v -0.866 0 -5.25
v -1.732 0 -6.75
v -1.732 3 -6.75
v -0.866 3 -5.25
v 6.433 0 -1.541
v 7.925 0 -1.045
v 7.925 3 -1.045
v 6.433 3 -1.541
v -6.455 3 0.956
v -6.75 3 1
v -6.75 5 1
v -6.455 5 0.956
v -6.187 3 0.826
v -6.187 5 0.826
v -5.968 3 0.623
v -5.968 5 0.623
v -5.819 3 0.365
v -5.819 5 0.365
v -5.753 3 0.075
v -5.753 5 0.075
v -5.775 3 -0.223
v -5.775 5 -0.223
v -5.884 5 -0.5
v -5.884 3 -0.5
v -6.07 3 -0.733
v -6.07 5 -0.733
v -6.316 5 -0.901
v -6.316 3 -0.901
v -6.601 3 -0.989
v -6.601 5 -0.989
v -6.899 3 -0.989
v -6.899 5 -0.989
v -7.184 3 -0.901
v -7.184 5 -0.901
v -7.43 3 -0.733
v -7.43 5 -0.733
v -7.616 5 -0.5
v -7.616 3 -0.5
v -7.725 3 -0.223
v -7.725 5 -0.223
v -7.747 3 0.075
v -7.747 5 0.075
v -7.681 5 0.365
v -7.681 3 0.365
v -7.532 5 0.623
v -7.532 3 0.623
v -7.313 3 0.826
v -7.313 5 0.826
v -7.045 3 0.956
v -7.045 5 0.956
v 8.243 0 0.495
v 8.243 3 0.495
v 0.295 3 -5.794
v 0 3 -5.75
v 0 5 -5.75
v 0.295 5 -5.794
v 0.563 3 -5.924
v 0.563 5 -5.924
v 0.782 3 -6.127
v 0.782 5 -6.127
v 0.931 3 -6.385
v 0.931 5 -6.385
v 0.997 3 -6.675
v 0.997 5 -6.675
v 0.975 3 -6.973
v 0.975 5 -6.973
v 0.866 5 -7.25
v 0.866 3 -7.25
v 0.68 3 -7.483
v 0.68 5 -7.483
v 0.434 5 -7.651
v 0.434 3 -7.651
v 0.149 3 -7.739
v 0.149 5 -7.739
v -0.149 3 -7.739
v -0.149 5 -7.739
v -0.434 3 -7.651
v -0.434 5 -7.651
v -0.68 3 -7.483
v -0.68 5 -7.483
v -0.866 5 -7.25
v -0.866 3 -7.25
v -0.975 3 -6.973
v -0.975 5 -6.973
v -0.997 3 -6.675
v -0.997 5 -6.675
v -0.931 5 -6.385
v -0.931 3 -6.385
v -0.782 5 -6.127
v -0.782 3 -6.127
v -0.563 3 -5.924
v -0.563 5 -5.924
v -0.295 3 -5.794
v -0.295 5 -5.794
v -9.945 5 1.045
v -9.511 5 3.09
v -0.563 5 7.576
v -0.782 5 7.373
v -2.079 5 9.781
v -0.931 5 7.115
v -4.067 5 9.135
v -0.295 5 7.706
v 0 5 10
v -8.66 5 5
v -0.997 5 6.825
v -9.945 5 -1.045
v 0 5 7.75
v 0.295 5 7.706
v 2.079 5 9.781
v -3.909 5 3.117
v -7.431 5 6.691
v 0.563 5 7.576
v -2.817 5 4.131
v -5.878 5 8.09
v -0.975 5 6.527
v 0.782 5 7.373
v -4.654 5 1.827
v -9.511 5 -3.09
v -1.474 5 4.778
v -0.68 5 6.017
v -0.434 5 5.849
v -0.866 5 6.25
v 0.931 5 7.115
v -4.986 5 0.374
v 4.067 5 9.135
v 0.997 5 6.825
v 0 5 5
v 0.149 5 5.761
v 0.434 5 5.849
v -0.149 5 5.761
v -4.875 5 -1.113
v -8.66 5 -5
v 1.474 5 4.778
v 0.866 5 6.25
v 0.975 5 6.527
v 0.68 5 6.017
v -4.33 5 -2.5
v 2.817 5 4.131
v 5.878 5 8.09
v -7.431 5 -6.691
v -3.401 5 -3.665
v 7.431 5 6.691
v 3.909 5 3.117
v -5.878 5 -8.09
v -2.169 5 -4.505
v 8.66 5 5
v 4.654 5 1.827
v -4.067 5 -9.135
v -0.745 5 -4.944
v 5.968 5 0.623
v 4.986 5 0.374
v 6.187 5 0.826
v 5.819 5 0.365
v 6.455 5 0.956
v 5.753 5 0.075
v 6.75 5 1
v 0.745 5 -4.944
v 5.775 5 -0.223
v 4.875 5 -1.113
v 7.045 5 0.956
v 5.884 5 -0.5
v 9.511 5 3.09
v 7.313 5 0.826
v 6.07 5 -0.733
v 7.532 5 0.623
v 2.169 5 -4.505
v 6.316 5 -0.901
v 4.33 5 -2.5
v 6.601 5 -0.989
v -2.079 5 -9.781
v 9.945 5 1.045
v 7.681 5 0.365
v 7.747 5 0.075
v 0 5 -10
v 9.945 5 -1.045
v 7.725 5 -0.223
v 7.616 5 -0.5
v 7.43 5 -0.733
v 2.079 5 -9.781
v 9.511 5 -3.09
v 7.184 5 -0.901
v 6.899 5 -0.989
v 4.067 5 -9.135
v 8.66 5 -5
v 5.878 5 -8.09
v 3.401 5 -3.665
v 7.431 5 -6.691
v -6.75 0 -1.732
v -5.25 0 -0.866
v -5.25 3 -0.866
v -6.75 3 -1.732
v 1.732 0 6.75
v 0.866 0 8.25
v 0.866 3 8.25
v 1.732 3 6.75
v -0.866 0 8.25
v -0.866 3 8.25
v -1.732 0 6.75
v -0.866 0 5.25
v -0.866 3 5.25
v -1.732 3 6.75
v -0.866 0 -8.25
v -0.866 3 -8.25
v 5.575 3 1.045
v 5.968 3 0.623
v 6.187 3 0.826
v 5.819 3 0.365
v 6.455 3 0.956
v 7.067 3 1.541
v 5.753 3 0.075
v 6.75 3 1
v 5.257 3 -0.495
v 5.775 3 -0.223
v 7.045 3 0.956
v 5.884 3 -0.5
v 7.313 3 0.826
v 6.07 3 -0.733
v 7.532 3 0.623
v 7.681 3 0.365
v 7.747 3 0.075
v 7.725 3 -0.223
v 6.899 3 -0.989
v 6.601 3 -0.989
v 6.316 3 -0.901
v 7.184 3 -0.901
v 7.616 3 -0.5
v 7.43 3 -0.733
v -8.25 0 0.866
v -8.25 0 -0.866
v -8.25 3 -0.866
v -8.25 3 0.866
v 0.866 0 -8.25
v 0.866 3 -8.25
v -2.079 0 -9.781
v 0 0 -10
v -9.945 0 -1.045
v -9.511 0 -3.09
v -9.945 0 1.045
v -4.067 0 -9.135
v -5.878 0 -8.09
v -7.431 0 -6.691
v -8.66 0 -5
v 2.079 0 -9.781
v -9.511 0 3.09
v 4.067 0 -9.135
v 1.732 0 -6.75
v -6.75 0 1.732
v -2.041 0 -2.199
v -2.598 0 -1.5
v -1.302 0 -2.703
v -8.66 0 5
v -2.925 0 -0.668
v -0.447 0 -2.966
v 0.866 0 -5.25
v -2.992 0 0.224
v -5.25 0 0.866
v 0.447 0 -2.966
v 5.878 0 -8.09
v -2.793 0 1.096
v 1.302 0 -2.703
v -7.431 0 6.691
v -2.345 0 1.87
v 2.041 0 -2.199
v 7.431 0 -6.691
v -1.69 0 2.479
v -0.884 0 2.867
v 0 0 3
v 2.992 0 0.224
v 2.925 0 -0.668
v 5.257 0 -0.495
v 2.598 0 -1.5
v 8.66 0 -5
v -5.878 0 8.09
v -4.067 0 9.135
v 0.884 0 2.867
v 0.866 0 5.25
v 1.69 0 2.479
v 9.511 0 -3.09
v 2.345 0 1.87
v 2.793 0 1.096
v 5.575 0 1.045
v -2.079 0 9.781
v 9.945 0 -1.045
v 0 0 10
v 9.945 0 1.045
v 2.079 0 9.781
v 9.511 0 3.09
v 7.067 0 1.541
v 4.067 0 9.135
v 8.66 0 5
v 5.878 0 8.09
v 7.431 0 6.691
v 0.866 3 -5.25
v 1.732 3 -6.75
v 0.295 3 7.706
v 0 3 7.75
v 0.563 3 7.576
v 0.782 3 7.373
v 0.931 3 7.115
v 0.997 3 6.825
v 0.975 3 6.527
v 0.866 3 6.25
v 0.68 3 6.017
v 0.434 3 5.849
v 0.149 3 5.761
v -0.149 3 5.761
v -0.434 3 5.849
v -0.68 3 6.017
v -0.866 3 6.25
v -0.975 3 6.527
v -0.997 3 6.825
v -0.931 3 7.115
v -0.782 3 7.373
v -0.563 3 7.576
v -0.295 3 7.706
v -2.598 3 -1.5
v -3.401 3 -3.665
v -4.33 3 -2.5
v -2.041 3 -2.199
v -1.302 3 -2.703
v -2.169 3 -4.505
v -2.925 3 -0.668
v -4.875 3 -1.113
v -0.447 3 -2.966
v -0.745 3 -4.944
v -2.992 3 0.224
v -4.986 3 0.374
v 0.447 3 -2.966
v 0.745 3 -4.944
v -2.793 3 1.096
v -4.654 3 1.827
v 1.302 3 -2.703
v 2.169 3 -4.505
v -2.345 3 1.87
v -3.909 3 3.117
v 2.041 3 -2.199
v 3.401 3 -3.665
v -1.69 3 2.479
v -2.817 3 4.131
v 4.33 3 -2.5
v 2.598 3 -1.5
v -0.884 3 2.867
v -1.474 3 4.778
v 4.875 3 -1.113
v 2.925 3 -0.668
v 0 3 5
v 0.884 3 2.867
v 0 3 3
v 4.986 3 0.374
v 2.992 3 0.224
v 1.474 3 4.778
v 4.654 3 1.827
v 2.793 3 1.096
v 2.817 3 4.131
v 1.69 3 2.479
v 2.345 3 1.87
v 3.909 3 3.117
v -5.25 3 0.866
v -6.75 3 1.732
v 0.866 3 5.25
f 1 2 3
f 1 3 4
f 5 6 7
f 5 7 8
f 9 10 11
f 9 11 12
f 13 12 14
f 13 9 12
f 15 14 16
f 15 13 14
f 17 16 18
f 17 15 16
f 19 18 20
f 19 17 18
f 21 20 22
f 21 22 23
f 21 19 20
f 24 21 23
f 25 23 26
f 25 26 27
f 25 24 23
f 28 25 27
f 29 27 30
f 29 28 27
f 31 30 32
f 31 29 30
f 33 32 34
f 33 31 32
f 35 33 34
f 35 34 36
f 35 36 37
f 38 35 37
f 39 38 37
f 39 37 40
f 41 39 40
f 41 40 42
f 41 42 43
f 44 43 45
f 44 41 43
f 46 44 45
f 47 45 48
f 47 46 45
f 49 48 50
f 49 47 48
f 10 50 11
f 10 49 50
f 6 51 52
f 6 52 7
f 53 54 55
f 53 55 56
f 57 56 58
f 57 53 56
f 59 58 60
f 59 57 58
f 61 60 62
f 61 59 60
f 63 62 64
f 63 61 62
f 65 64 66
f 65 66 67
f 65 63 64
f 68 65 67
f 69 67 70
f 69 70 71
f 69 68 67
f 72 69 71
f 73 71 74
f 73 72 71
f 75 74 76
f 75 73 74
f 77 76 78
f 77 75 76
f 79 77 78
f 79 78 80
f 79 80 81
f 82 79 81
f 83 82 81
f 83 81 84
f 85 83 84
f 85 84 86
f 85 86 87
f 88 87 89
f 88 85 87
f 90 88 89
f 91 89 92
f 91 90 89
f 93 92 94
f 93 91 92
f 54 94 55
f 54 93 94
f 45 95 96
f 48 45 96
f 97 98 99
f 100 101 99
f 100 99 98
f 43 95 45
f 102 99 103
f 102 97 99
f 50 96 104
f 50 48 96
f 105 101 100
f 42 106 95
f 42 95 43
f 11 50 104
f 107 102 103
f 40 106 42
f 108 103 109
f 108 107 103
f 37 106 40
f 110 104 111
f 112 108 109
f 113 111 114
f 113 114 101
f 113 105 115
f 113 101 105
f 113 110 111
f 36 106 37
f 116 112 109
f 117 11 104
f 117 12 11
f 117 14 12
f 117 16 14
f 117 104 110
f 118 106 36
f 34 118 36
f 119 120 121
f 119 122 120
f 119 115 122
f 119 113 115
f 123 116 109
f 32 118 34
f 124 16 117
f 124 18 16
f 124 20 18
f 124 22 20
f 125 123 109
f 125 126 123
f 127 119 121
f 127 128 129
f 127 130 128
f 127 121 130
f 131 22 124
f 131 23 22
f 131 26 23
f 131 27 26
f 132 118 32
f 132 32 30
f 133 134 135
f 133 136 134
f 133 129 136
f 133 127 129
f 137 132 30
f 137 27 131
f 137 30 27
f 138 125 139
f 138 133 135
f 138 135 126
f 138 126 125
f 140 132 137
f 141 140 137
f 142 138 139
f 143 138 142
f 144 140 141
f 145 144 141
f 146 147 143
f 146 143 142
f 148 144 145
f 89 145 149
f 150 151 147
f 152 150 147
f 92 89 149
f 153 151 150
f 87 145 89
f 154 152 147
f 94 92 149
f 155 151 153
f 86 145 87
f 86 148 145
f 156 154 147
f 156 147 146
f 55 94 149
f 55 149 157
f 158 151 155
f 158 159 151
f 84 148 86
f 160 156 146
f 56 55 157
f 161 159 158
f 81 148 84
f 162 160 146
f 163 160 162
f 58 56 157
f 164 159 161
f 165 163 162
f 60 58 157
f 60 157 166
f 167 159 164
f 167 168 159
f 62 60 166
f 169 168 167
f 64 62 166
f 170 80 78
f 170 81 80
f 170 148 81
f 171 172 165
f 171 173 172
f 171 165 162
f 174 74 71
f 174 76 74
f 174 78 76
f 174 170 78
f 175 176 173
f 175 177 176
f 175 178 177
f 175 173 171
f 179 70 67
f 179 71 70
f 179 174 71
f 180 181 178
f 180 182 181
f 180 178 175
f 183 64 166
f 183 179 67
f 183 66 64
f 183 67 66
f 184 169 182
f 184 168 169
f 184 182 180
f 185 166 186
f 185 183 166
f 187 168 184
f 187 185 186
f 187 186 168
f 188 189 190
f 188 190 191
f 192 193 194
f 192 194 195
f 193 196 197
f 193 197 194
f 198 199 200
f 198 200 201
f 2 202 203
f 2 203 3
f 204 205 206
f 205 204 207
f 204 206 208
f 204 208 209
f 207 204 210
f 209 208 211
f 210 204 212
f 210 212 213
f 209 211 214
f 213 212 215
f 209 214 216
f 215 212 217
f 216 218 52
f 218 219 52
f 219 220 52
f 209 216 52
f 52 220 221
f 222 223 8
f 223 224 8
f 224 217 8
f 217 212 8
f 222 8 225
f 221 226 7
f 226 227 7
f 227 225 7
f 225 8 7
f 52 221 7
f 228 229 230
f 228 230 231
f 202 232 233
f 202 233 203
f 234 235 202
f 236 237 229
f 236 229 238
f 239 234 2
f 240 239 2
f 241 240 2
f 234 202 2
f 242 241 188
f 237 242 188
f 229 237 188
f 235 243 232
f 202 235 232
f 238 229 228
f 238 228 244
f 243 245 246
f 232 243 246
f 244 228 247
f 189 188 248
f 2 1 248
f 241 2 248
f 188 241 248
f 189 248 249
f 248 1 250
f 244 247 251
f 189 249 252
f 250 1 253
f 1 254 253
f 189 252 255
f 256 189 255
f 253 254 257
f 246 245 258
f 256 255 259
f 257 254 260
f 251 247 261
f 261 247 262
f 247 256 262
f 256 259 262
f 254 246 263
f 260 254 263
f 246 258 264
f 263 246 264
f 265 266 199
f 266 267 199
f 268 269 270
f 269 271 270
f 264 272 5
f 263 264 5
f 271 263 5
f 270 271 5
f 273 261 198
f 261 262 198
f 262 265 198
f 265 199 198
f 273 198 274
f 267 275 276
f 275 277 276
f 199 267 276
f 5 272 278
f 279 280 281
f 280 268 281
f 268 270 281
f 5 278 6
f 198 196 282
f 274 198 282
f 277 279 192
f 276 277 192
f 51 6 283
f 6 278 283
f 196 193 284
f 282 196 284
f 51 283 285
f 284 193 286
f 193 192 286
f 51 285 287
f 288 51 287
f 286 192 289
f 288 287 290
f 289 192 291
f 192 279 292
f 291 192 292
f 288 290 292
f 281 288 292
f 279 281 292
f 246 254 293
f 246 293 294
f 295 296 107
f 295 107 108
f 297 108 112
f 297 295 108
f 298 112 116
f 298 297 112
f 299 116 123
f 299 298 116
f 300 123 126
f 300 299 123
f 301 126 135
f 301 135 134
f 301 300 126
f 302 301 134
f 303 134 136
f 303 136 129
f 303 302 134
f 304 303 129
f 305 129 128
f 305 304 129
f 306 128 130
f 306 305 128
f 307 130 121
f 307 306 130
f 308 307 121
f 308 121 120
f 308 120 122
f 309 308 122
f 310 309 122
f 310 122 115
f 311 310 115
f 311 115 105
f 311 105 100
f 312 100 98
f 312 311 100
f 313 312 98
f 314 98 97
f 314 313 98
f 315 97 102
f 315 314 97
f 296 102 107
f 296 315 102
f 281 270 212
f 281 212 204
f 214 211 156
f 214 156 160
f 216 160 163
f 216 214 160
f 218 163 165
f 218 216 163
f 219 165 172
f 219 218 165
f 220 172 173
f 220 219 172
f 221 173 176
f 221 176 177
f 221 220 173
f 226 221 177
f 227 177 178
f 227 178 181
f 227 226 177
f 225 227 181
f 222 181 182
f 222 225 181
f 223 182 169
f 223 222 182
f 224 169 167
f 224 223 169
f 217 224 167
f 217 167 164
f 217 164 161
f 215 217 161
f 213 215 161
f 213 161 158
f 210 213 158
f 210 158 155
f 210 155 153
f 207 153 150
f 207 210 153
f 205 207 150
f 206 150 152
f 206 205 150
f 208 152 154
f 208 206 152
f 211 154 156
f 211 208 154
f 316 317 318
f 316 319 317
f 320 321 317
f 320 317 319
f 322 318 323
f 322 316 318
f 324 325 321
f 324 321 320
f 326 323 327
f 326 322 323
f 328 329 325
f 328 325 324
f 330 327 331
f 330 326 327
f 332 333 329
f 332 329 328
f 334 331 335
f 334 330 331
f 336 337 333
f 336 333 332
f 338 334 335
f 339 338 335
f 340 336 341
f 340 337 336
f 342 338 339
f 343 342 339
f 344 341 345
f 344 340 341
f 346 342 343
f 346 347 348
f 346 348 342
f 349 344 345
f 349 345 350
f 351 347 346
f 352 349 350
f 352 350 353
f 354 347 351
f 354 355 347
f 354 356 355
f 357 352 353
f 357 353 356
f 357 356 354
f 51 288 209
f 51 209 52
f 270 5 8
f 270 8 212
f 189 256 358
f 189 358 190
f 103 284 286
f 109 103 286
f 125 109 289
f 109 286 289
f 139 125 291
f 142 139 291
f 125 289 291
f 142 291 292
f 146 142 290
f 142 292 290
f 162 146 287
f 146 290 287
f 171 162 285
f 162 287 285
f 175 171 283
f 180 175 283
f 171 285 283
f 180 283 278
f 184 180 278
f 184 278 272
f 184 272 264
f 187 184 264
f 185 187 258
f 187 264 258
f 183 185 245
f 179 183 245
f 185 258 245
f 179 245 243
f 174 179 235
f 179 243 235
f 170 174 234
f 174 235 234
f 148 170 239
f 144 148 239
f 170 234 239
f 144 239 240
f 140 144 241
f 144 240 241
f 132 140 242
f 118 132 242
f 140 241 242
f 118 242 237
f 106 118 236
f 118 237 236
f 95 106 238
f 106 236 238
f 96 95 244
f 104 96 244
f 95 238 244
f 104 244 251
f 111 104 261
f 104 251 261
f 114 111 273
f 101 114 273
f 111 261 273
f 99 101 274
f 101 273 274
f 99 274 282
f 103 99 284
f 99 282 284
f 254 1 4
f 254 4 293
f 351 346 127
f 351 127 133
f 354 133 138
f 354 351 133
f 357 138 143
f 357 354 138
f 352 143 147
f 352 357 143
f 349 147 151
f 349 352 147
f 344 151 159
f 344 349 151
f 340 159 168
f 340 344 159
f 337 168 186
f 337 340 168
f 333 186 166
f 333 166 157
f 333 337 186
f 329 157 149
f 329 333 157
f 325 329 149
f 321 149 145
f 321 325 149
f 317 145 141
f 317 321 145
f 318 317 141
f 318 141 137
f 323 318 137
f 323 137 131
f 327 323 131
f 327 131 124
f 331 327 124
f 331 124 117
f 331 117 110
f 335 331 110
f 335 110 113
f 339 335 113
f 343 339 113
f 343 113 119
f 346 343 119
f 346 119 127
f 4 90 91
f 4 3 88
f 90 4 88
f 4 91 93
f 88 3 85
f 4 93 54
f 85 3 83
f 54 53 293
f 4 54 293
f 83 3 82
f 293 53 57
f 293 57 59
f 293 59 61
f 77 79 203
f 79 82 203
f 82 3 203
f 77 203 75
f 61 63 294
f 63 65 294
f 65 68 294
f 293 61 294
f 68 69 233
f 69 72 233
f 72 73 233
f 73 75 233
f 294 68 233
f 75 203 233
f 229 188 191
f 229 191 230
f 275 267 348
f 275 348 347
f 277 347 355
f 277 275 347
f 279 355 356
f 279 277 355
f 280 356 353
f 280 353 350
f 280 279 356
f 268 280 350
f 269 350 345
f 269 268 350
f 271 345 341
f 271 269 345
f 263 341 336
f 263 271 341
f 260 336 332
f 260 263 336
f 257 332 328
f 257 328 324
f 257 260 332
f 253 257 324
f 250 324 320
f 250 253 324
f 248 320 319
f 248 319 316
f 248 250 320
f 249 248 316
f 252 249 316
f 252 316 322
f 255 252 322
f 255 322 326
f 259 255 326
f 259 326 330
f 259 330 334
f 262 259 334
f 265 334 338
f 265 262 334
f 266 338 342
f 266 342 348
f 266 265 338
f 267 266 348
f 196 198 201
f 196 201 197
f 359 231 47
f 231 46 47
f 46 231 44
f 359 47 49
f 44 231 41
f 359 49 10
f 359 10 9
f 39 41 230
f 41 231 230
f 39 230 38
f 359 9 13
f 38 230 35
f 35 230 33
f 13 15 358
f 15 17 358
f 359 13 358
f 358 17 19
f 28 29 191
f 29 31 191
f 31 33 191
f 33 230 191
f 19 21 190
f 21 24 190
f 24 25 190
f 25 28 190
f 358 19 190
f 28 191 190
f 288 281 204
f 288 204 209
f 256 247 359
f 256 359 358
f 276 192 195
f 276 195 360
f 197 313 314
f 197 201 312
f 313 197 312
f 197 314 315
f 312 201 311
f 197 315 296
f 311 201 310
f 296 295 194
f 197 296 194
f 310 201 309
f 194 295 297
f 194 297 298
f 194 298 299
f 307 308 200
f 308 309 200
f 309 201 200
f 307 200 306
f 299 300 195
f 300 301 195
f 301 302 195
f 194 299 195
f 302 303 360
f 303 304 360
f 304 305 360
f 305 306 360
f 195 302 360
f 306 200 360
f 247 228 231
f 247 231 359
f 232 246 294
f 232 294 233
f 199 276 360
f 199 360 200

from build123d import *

# Parameters (mm, degrees)
SKETCH1_R           = 5
SKETCH1_R_2         = 3
BOSS_EXTRUDE1_DEPTH = 3
SKETCH1_3_R         = 10
SKETCH1_3_R_2       = 5
BOSS_EXTRUDE2_DEPTH = 5
BOSS_EXTRUDE3_START = 3
SKETCH1_4_R         = 1
BOSS_EXTRUDE3_DEPTH = 2


with BuildPart() as part:
    # Sketch1 → Boss-Extrude1 (new body)
    with BuildSketch(Plane(origin=(0, 0, 0), x_dir=(1, 0, 0), z_dir=(0, 1, 0))):
        Circle(SKETCH1_R)
        Circle(SKETCH1_R_2, mode=Mode.SUBTRACT)
    extrude(amount=BOSS_EXTRUDE1_DEPTH)

    # Sketch1<3> → Boss-Extrude2 (add)
    with BuildSketch(Plane(origin=(0, 0, 0), x_dir=(1, 0, 0), z_dir=(0, 1, 0))):
        Circle(SKETCH1_3_R)
        Polygon((0.866025404, -5.25), (1.732050808, -6.75), (0.866025404, -8.25), (-0.866025404, -8.25), (-1.732050808, -6.75), (-0.866025404, -5.25), align=None, mode=Mode.SUBTRACT)
        Polygon((-5.25, -0.866025404), (-6.75, -1.732050808), (-8.25, -0.866025404), (-8.25, 0.866025404), (-6.75, 1.732050808), (-5.25, 0.866025404), align=None, mode=Mode.SUBTRACT)
        Circle(SKETCH1_3_R_2, mode=Mode.SUBTRACT)
        Polygon((7.92546773, 1.045127089), (8.242840474, -0.495421371), (7.067372744, -1.54054846), (5.57453227, -1.045127089), (5.257159526, 0.495421371), (6.432627256, 1.54054846), align=None, mode=Mode.SUBTRACT)
        Polygon((0.866025404, 8.25), (1.732050808, 6.75), (0.866025404, 5.25), (-0.866025404, 5.25), (-1.732050808, 6.75), (-0.866025404, 8.25), align=None, mode=Mode.SUBTRACT)
    extrude(amount=BOSS_EXTRUDE2_DEPTH)

    # Sketch1<4> → Boss-Extrude3 (add)
    # profile 1 of 4: a face of its own
    with BuildSketch(Plane(origin=(0, 0, 0), x_dir=(1, 0, 0), z_dir=(0, 1, 0)).offset(BOSS_EXTRUDE3_START)):
        Polygon((-8.25, -0.866025404), (-6.75, -1.732050808), (-5.25, -0.866025404), (-5.25, 0.866025404), (-6.75, 1.732050808), (-8.25, 0.866025404), align=None)
        with Locations((-6.75, 0)):
            Circle(SKETCH1_4_R, mode=Mode.SUBTRACT)
    # profile 2 of 4: a face of its own
    with BuildSketch(Plane(origin=(0, 0, 0), x_dir=(1, 0, 0), z_dir=(0, 1, 0)).offset(BOSS_EXTRUDE3_START)):
        Polygon((0.866025404, 5.25), (1.732050808, 6.75), (0.866025404, 8.25), (-0.866025404, 8.25), (-1.732050808, 6.75), (-0.866025404, 5.25), align=None)
        with Locations((0, 6.75)):
            Circle(SKETCH1_4_R, mode=Mode.SUBTRACT)
    # profile 3 of 4: a face of its own
    with BuildSketch(Plane(origin=(0, 0, 0), x_dir=(1, 0, 0), z_dir=(0, 1, 0)).offset(BOSS_EXTRUDE3_START)):
        Polygon((7.067372744, -1.54054846), (8.242840474, -0.495421371), (7.92546773, 1.045127089), (6.432627256, 1.54054846), (5.257159526, 0.495421371), (5.57453227, -1.045127089), align=None)
        with Locations((6.75, 0)):
            Circle(SKETCH1_4_R, mode=Mode.SUBTRACT)
    # profile 4 of 4: a face of its own
    with BuildSketch(Plane(origin=(0, 0, 0), x_dir=(1, 0, 0), z_dir=(0, 1, 0)).offset(BOSS_EXTRUDE3_START)):
        Polygon((0.866025404, -8.25), (1.732050808, -6.75), (0.866025404, -5.25), (-0.866025404, -5.25), (-1.732050808, -6.75), (-0.866025404, -8.25), align=None)
        with Locations((0, -6.75)):
            Circle(SKETCH1_4_R, mode=Mode.SUBTRACT)
    extrude(amount=BOSS_EXTRUDE3_DEPTH)


solid = part.part
